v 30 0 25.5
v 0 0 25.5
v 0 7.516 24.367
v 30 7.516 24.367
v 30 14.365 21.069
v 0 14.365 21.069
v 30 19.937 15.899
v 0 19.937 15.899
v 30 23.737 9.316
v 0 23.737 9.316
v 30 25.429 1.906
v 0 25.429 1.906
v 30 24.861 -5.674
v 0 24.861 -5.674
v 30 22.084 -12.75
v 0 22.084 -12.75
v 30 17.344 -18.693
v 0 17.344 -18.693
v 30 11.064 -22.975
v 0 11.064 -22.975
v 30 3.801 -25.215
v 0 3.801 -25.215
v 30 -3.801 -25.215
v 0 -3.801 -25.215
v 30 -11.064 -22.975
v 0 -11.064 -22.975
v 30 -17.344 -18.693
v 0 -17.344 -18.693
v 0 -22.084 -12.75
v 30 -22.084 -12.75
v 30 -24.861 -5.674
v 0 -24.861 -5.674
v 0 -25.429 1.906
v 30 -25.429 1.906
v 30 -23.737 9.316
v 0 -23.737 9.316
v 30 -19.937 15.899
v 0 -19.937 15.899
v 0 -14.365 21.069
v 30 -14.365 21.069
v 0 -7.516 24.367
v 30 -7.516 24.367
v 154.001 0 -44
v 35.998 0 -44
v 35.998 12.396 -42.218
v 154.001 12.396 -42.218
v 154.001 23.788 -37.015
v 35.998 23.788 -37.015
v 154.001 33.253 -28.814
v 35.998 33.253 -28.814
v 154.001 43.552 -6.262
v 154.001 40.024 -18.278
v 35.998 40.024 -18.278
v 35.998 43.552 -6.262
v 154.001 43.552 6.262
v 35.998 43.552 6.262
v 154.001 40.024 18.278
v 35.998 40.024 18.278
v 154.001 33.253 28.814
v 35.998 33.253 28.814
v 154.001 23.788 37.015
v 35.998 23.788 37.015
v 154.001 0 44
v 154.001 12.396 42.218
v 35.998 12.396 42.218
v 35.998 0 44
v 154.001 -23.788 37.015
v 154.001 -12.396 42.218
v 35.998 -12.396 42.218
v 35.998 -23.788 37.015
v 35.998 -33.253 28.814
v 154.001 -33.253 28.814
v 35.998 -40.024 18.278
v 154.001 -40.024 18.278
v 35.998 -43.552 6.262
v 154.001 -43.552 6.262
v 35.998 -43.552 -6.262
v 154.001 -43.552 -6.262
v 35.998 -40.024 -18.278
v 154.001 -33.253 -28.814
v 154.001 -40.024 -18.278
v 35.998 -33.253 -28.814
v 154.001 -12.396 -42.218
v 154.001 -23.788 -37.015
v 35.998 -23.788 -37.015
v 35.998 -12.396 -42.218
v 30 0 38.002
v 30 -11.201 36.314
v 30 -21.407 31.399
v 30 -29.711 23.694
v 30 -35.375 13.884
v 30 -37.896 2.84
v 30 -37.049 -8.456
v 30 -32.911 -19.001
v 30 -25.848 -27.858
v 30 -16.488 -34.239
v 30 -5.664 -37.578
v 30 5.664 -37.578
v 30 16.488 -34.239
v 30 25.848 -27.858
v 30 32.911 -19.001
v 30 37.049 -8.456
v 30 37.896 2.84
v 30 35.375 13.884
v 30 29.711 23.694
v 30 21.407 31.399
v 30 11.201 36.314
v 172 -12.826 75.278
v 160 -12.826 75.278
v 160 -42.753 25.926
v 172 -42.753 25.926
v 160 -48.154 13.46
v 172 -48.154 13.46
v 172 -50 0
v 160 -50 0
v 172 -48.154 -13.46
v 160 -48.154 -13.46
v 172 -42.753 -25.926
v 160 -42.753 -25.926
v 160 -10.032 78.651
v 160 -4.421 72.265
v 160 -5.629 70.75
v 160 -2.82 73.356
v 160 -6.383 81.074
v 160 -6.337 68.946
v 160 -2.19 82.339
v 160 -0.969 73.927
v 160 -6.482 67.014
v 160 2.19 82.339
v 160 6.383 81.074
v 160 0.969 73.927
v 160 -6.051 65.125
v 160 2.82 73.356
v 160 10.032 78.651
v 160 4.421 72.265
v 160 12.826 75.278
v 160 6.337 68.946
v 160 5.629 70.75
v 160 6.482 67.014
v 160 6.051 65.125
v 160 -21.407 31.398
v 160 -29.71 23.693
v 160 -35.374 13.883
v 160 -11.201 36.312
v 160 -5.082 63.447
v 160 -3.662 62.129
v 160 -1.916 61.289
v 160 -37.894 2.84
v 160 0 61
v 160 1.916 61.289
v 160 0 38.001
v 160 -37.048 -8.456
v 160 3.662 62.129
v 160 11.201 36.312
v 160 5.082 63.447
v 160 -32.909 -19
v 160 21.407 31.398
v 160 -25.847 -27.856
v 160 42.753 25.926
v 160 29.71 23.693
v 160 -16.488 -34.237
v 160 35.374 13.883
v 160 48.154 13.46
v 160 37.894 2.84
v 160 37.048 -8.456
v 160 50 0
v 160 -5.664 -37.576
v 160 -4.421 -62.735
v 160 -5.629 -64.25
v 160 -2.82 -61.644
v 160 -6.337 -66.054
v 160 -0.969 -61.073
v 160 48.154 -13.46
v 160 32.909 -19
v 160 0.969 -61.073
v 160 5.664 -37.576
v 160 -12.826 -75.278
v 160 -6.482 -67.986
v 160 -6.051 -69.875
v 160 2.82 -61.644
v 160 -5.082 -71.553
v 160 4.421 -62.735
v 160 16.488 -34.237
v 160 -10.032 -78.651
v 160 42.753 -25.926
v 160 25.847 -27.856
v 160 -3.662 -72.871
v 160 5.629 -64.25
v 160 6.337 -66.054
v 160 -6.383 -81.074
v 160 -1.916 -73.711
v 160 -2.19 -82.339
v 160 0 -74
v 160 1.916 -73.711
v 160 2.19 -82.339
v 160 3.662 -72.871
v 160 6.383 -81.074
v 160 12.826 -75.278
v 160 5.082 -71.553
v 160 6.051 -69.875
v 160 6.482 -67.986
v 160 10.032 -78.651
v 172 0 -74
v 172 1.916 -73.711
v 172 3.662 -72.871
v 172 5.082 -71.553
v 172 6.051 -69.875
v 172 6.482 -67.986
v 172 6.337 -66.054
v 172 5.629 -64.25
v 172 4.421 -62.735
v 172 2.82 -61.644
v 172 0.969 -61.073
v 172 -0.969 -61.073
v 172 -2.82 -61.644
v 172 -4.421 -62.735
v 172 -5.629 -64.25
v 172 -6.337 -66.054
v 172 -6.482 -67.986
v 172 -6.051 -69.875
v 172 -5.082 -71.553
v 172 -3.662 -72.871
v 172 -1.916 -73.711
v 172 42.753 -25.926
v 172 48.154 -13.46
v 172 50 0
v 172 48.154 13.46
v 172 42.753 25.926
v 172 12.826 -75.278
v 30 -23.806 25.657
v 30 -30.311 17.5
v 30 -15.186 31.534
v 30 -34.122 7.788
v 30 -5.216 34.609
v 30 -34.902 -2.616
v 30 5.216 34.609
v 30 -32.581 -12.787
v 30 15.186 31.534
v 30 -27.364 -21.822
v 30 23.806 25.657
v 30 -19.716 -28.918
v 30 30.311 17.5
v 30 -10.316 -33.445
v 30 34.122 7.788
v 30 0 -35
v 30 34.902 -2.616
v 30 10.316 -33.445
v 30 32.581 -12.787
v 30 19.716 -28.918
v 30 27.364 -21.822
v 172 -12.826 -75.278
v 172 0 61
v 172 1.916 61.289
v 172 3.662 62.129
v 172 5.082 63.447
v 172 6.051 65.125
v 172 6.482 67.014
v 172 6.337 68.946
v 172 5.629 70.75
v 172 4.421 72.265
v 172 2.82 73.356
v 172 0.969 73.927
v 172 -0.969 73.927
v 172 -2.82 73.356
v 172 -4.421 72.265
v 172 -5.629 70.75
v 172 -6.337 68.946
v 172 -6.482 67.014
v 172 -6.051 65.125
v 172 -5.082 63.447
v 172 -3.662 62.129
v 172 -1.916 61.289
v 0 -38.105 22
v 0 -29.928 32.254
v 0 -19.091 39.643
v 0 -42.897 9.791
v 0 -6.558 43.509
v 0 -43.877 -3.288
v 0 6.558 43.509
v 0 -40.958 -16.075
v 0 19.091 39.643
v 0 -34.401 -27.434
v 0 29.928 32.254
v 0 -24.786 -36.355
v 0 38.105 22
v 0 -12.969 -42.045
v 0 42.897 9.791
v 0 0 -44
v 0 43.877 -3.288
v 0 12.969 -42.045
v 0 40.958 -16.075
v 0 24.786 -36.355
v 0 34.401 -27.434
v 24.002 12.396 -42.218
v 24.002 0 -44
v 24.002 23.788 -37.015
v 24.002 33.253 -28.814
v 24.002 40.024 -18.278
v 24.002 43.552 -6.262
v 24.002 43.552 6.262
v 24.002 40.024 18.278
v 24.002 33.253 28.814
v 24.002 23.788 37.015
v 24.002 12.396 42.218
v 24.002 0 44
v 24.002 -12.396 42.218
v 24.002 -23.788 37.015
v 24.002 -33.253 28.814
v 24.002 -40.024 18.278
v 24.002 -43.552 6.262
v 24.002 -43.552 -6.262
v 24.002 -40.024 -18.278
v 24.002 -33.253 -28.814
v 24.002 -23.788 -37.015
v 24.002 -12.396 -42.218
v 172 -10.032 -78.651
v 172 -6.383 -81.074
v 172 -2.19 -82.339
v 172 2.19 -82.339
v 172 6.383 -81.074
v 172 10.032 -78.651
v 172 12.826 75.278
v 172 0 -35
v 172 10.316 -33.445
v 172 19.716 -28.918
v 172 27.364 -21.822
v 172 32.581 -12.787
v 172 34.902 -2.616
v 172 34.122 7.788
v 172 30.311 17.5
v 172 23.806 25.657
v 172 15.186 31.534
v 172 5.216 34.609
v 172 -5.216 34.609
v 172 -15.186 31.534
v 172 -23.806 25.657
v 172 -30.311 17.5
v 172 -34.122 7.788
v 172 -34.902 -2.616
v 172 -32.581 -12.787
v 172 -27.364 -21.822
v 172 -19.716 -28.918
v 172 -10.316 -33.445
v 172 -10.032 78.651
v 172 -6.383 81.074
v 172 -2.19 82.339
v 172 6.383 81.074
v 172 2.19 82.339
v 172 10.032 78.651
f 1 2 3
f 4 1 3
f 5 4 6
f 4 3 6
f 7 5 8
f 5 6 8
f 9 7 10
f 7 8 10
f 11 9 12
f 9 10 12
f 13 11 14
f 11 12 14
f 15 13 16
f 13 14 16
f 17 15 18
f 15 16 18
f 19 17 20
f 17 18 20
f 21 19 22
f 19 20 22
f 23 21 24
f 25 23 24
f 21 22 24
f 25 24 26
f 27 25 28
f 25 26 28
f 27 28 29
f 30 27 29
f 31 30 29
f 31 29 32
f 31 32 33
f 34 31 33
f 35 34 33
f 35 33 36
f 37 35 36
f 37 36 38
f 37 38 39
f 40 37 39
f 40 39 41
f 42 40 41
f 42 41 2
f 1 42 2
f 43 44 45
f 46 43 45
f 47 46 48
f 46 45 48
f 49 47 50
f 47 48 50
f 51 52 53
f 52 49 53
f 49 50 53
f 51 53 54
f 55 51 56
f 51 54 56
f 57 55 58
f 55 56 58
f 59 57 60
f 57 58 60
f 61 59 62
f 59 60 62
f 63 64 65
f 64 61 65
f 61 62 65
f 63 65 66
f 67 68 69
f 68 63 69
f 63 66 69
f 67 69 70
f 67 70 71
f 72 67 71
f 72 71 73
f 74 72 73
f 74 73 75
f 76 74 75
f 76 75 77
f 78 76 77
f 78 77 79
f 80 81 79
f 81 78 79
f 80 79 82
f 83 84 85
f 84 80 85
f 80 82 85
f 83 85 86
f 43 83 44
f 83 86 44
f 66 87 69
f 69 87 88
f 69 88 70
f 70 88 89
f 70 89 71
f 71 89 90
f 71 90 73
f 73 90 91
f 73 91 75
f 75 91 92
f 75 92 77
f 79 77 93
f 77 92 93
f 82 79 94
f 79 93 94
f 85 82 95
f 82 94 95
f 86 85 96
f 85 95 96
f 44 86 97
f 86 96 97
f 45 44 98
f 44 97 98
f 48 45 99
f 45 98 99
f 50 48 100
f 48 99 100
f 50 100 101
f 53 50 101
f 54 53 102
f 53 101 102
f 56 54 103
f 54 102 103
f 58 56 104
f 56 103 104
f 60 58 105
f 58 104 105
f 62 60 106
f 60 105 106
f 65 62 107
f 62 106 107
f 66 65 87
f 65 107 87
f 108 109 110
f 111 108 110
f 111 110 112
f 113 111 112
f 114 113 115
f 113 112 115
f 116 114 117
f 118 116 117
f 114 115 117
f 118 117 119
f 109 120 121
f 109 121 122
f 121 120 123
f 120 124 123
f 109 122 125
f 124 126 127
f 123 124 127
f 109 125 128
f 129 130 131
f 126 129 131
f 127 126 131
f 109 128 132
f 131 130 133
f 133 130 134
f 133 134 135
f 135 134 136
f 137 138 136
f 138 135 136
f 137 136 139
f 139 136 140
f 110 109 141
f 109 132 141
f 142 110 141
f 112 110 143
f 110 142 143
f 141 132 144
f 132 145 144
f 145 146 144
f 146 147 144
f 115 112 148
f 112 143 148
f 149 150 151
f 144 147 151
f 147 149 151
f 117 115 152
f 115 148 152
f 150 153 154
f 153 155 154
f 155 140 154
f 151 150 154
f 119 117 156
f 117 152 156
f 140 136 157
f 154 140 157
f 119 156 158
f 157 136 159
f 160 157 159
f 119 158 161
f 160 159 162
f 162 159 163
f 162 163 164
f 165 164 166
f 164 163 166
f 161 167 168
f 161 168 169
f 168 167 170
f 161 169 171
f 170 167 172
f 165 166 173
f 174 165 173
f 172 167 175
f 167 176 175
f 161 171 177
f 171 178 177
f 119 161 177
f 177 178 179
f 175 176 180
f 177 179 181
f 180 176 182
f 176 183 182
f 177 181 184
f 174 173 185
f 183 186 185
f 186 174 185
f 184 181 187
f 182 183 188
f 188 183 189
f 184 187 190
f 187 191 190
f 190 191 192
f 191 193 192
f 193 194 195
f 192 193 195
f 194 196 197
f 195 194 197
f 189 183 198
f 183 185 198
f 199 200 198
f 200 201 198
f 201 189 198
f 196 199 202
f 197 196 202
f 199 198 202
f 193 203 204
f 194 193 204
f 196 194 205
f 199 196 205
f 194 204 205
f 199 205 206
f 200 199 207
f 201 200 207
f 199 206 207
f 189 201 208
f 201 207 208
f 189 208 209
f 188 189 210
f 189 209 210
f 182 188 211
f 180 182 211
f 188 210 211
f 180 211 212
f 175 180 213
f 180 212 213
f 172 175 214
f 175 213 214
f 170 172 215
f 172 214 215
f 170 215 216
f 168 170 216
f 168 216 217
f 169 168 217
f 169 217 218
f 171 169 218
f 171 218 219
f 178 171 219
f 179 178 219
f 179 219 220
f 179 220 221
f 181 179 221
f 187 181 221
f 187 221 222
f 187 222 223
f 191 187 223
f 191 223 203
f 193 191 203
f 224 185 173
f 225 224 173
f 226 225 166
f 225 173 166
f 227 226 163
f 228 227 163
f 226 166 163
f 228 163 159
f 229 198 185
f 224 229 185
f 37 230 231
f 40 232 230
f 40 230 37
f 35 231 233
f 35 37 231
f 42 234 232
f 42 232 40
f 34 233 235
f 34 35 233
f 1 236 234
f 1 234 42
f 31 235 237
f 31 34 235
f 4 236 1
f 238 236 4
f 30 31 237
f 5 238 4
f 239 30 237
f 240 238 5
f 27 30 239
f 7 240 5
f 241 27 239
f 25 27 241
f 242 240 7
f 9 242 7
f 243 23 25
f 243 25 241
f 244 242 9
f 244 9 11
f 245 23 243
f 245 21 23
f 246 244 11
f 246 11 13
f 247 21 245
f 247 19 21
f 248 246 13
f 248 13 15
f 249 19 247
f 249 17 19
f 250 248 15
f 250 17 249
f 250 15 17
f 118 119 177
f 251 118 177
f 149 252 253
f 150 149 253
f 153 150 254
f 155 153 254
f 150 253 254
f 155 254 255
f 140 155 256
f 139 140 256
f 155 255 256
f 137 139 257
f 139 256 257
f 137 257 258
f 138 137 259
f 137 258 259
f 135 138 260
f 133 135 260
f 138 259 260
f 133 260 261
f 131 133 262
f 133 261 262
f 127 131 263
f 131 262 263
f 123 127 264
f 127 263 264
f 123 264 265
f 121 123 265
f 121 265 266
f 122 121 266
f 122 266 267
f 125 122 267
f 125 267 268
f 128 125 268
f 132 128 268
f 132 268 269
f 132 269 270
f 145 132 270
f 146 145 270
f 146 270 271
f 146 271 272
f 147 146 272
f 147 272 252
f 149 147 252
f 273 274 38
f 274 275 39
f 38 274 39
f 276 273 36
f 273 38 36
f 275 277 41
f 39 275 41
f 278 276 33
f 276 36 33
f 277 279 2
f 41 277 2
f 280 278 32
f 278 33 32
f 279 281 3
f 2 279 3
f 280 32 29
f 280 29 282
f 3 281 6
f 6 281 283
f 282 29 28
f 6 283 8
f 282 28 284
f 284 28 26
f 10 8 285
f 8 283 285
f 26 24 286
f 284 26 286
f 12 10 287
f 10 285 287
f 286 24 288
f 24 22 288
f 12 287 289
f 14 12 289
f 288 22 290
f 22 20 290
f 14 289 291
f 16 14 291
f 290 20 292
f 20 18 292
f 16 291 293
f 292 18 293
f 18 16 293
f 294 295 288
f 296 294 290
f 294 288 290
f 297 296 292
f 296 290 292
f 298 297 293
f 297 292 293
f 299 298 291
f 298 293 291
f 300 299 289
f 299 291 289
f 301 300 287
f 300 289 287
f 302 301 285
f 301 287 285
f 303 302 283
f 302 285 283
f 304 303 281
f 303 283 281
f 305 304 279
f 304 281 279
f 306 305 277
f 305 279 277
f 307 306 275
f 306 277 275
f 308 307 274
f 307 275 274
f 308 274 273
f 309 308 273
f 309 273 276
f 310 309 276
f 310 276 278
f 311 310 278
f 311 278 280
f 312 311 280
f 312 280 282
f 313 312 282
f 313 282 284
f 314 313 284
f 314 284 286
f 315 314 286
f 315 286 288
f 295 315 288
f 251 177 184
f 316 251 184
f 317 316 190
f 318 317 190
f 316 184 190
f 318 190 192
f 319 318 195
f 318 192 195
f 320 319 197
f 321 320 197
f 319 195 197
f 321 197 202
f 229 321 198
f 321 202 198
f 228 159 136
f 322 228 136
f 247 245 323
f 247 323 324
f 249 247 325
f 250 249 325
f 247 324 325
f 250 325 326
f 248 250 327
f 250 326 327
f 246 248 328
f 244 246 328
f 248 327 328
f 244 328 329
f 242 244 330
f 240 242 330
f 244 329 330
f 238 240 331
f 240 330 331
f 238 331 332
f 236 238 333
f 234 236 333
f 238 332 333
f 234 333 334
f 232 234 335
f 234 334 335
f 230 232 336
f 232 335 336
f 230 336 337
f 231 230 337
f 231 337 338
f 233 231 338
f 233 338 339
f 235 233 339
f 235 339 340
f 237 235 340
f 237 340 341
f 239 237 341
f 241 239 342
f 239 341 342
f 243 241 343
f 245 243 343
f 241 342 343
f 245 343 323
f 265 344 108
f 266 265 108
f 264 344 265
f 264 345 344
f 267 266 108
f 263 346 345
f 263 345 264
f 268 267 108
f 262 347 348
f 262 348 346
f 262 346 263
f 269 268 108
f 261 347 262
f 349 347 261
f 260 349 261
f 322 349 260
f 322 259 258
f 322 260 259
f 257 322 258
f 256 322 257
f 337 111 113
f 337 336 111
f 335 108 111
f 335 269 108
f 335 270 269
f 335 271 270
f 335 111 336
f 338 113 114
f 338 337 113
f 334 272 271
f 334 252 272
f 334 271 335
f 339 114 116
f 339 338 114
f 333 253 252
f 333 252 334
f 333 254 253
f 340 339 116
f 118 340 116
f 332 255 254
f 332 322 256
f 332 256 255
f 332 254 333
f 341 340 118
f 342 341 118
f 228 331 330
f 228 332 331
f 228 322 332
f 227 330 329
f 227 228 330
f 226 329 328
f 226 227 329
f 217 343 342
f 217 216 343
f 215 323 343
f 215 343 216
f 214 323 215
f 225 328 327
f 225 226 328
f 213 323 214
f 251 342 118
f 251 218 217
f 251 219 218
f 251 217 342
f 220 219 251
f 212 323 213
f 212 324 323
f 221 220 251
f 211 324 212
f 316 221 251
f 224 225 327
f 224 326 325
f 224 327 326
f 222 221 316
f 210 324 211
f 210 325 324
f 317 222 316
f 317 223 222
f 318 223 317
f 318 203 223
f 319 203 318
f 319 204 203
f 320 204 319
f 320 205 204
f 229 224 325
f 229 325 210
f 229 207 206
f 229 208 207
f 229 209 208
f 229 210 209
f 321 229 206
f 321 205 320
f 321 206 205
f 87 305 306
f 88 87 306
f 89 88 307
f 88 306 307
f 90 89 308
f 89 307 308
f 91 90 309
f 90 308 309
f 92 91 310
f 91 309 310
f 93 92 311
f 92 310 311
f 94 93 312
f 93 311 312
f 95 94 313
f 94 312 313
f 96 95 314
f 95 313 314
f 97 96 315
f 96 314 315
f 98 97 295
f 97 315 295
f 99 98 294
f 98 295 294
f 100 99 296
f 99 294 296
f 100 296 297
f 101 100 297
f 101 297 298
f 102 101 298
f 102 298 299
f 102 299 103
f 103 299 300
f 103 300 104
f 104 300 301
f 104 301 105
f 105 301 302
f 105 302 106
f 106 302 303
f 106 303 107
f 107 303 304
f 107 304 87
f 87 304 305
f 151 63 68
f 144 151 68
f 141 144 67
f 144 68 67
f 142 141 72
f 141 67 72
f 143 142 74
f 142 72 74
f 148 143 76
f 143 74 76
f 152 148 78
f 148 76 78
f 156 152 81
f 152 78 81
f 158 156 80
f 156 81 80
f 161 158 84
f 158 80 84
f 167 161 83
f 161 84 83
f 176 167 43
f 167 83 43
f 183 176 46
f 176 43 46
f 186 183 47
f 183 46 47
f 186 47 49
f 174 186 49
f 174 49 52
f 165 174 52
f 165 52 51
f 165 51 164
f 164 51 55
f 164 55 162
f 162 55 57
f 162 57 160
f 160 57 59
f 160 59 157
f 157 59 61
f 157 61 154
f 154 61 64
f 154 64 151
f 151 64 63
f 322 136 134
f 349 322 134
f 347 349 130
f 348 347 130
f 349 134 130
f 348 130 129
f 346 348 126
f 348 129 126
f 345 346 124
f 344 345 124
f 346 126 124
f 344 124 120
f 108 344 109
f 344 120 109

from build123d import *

# Parameters (mm, degrees)
SKETCH1_R           = 44
BOSS_EXTRUDE1_DEPTH = 160
BOSS_EXTRUDE2_DEPTH = 12
SKETCH5_R           = 6.5
CUT_EXTRUDE3_DEPTH  = 80
SKETCH6_R           = 35
CUT_EXTRUDE4_DEPTH  = 142
SKETCH7_R           = 25.5
CUT_EXTRUDE5_DEPTH  = 82


with BuildPart() as part:
    # Sketch1 → Boss-Extrude1 (new body)
    with BuildSketch(Plane(origin=(0, 0, 0), x_dir=(0, 0, -1), z_dir=(1, 0, 0))):
        Circle(SKETCH1_R)
    extrude(amount=BOSS_EXTRUDE1_DEPTH)

    # Sketch2 → Boss-Extrude2 (add)
    with BuildSketch(Plane(origin=(160, 0, 0), x_dir=(0, 0, -1), z_dir=(1, 0, 0))):
        with BuildLine():
            Line((-25.925925926, 42.753319928), (-75.277777778, 12.825995978))
            ThreePointArc((-75.277777778, 12.825995978), (-82.5, 0), (-75.277777778, -12.825995978))
            Line((-75.277777778, -12.825995978), (-25.925925926, -42.753319928))
            ThreePointArc((-25.925925926, -42.753319928), (0, -50), (25.925925926, -42.753319928))
            Line((25.925925926, -42.753319928), (75.277777778, -12.825995978))
            ThreePointArc((75.277777778, -12.825995978), (82.5, 0), (75.277777778, 12.825995978))
            Line((75.277777778, 12.825995978), (25.925925926, 42.753319928))
            ThreePointArc((25.925925926, 42.753319928), (0, 50), (-25.925925926, 42.753319928))
        make_face()
    extrude(amount=BOSS_EXTRUDE2_DEPTH)

    # Sketch5 → Cut-Extrude3 (cut)
    with BuildSketch(Plane(origin=(172, 0, 0), x_dir=(0, 0, -1), z_dir=(1, 0, 0))):
        with Locations((67.5, 0)):
            Circle(SKETCH5_R)
        with Locations((-67.5, 0)):
            Circle(SKETCH5_R)
    extrude(amount=-CUT_EXTRUDE3_DEPTH, mode=Mode.SUBTRACT)

    # Sketch6 → Cut-Extrude4 (cut)
    with BuildSketch(Plane(origin=(172, 0, 0), x_dir=(0, 0, -1), z_dir=(1, 0, 0))):
        Circle(SKETCH6_R)
    extrude(amount=-CUT_EXTRUDE4_DEPTH, mode=Mode.SUBTRACT)

    # Sketch7 → Cut-Extrude5 (cut)
    with BuildSketch(Plane.ZY):
        Circle(SKETCH7_R)
    extrude(amount=-CUT_EXTRUDE5_DEPTH, mode=Mode.SUBTRACT)

    # Sketch9 → Cut-Revolve1 (revolve, cut)
    with BuildSketch(Plane(origin=(0, 0, 0), x_dir=(1, 0, 0), z_dir=(0, 1, 0)), mode=Mode.PRIVATE) as cut_revolve1_sk:
        Polygon((30, 38.002095215), (23.999999428, 44.002095215), (35.999999428, 44.002095215), align=None)
        Polygon((160, 44.000612252), (160, 38.000612252), (154, 44.000612252), align=None)
    revolve(cut_revolve1_sk.sketch.rotate(Axis((0, 0, 0), (1, 0, 0)), 180), axis=Axis((0, 0, 0), (1, 0, 0)), mode=Mode.SUBTRACT)


solid = part.part
